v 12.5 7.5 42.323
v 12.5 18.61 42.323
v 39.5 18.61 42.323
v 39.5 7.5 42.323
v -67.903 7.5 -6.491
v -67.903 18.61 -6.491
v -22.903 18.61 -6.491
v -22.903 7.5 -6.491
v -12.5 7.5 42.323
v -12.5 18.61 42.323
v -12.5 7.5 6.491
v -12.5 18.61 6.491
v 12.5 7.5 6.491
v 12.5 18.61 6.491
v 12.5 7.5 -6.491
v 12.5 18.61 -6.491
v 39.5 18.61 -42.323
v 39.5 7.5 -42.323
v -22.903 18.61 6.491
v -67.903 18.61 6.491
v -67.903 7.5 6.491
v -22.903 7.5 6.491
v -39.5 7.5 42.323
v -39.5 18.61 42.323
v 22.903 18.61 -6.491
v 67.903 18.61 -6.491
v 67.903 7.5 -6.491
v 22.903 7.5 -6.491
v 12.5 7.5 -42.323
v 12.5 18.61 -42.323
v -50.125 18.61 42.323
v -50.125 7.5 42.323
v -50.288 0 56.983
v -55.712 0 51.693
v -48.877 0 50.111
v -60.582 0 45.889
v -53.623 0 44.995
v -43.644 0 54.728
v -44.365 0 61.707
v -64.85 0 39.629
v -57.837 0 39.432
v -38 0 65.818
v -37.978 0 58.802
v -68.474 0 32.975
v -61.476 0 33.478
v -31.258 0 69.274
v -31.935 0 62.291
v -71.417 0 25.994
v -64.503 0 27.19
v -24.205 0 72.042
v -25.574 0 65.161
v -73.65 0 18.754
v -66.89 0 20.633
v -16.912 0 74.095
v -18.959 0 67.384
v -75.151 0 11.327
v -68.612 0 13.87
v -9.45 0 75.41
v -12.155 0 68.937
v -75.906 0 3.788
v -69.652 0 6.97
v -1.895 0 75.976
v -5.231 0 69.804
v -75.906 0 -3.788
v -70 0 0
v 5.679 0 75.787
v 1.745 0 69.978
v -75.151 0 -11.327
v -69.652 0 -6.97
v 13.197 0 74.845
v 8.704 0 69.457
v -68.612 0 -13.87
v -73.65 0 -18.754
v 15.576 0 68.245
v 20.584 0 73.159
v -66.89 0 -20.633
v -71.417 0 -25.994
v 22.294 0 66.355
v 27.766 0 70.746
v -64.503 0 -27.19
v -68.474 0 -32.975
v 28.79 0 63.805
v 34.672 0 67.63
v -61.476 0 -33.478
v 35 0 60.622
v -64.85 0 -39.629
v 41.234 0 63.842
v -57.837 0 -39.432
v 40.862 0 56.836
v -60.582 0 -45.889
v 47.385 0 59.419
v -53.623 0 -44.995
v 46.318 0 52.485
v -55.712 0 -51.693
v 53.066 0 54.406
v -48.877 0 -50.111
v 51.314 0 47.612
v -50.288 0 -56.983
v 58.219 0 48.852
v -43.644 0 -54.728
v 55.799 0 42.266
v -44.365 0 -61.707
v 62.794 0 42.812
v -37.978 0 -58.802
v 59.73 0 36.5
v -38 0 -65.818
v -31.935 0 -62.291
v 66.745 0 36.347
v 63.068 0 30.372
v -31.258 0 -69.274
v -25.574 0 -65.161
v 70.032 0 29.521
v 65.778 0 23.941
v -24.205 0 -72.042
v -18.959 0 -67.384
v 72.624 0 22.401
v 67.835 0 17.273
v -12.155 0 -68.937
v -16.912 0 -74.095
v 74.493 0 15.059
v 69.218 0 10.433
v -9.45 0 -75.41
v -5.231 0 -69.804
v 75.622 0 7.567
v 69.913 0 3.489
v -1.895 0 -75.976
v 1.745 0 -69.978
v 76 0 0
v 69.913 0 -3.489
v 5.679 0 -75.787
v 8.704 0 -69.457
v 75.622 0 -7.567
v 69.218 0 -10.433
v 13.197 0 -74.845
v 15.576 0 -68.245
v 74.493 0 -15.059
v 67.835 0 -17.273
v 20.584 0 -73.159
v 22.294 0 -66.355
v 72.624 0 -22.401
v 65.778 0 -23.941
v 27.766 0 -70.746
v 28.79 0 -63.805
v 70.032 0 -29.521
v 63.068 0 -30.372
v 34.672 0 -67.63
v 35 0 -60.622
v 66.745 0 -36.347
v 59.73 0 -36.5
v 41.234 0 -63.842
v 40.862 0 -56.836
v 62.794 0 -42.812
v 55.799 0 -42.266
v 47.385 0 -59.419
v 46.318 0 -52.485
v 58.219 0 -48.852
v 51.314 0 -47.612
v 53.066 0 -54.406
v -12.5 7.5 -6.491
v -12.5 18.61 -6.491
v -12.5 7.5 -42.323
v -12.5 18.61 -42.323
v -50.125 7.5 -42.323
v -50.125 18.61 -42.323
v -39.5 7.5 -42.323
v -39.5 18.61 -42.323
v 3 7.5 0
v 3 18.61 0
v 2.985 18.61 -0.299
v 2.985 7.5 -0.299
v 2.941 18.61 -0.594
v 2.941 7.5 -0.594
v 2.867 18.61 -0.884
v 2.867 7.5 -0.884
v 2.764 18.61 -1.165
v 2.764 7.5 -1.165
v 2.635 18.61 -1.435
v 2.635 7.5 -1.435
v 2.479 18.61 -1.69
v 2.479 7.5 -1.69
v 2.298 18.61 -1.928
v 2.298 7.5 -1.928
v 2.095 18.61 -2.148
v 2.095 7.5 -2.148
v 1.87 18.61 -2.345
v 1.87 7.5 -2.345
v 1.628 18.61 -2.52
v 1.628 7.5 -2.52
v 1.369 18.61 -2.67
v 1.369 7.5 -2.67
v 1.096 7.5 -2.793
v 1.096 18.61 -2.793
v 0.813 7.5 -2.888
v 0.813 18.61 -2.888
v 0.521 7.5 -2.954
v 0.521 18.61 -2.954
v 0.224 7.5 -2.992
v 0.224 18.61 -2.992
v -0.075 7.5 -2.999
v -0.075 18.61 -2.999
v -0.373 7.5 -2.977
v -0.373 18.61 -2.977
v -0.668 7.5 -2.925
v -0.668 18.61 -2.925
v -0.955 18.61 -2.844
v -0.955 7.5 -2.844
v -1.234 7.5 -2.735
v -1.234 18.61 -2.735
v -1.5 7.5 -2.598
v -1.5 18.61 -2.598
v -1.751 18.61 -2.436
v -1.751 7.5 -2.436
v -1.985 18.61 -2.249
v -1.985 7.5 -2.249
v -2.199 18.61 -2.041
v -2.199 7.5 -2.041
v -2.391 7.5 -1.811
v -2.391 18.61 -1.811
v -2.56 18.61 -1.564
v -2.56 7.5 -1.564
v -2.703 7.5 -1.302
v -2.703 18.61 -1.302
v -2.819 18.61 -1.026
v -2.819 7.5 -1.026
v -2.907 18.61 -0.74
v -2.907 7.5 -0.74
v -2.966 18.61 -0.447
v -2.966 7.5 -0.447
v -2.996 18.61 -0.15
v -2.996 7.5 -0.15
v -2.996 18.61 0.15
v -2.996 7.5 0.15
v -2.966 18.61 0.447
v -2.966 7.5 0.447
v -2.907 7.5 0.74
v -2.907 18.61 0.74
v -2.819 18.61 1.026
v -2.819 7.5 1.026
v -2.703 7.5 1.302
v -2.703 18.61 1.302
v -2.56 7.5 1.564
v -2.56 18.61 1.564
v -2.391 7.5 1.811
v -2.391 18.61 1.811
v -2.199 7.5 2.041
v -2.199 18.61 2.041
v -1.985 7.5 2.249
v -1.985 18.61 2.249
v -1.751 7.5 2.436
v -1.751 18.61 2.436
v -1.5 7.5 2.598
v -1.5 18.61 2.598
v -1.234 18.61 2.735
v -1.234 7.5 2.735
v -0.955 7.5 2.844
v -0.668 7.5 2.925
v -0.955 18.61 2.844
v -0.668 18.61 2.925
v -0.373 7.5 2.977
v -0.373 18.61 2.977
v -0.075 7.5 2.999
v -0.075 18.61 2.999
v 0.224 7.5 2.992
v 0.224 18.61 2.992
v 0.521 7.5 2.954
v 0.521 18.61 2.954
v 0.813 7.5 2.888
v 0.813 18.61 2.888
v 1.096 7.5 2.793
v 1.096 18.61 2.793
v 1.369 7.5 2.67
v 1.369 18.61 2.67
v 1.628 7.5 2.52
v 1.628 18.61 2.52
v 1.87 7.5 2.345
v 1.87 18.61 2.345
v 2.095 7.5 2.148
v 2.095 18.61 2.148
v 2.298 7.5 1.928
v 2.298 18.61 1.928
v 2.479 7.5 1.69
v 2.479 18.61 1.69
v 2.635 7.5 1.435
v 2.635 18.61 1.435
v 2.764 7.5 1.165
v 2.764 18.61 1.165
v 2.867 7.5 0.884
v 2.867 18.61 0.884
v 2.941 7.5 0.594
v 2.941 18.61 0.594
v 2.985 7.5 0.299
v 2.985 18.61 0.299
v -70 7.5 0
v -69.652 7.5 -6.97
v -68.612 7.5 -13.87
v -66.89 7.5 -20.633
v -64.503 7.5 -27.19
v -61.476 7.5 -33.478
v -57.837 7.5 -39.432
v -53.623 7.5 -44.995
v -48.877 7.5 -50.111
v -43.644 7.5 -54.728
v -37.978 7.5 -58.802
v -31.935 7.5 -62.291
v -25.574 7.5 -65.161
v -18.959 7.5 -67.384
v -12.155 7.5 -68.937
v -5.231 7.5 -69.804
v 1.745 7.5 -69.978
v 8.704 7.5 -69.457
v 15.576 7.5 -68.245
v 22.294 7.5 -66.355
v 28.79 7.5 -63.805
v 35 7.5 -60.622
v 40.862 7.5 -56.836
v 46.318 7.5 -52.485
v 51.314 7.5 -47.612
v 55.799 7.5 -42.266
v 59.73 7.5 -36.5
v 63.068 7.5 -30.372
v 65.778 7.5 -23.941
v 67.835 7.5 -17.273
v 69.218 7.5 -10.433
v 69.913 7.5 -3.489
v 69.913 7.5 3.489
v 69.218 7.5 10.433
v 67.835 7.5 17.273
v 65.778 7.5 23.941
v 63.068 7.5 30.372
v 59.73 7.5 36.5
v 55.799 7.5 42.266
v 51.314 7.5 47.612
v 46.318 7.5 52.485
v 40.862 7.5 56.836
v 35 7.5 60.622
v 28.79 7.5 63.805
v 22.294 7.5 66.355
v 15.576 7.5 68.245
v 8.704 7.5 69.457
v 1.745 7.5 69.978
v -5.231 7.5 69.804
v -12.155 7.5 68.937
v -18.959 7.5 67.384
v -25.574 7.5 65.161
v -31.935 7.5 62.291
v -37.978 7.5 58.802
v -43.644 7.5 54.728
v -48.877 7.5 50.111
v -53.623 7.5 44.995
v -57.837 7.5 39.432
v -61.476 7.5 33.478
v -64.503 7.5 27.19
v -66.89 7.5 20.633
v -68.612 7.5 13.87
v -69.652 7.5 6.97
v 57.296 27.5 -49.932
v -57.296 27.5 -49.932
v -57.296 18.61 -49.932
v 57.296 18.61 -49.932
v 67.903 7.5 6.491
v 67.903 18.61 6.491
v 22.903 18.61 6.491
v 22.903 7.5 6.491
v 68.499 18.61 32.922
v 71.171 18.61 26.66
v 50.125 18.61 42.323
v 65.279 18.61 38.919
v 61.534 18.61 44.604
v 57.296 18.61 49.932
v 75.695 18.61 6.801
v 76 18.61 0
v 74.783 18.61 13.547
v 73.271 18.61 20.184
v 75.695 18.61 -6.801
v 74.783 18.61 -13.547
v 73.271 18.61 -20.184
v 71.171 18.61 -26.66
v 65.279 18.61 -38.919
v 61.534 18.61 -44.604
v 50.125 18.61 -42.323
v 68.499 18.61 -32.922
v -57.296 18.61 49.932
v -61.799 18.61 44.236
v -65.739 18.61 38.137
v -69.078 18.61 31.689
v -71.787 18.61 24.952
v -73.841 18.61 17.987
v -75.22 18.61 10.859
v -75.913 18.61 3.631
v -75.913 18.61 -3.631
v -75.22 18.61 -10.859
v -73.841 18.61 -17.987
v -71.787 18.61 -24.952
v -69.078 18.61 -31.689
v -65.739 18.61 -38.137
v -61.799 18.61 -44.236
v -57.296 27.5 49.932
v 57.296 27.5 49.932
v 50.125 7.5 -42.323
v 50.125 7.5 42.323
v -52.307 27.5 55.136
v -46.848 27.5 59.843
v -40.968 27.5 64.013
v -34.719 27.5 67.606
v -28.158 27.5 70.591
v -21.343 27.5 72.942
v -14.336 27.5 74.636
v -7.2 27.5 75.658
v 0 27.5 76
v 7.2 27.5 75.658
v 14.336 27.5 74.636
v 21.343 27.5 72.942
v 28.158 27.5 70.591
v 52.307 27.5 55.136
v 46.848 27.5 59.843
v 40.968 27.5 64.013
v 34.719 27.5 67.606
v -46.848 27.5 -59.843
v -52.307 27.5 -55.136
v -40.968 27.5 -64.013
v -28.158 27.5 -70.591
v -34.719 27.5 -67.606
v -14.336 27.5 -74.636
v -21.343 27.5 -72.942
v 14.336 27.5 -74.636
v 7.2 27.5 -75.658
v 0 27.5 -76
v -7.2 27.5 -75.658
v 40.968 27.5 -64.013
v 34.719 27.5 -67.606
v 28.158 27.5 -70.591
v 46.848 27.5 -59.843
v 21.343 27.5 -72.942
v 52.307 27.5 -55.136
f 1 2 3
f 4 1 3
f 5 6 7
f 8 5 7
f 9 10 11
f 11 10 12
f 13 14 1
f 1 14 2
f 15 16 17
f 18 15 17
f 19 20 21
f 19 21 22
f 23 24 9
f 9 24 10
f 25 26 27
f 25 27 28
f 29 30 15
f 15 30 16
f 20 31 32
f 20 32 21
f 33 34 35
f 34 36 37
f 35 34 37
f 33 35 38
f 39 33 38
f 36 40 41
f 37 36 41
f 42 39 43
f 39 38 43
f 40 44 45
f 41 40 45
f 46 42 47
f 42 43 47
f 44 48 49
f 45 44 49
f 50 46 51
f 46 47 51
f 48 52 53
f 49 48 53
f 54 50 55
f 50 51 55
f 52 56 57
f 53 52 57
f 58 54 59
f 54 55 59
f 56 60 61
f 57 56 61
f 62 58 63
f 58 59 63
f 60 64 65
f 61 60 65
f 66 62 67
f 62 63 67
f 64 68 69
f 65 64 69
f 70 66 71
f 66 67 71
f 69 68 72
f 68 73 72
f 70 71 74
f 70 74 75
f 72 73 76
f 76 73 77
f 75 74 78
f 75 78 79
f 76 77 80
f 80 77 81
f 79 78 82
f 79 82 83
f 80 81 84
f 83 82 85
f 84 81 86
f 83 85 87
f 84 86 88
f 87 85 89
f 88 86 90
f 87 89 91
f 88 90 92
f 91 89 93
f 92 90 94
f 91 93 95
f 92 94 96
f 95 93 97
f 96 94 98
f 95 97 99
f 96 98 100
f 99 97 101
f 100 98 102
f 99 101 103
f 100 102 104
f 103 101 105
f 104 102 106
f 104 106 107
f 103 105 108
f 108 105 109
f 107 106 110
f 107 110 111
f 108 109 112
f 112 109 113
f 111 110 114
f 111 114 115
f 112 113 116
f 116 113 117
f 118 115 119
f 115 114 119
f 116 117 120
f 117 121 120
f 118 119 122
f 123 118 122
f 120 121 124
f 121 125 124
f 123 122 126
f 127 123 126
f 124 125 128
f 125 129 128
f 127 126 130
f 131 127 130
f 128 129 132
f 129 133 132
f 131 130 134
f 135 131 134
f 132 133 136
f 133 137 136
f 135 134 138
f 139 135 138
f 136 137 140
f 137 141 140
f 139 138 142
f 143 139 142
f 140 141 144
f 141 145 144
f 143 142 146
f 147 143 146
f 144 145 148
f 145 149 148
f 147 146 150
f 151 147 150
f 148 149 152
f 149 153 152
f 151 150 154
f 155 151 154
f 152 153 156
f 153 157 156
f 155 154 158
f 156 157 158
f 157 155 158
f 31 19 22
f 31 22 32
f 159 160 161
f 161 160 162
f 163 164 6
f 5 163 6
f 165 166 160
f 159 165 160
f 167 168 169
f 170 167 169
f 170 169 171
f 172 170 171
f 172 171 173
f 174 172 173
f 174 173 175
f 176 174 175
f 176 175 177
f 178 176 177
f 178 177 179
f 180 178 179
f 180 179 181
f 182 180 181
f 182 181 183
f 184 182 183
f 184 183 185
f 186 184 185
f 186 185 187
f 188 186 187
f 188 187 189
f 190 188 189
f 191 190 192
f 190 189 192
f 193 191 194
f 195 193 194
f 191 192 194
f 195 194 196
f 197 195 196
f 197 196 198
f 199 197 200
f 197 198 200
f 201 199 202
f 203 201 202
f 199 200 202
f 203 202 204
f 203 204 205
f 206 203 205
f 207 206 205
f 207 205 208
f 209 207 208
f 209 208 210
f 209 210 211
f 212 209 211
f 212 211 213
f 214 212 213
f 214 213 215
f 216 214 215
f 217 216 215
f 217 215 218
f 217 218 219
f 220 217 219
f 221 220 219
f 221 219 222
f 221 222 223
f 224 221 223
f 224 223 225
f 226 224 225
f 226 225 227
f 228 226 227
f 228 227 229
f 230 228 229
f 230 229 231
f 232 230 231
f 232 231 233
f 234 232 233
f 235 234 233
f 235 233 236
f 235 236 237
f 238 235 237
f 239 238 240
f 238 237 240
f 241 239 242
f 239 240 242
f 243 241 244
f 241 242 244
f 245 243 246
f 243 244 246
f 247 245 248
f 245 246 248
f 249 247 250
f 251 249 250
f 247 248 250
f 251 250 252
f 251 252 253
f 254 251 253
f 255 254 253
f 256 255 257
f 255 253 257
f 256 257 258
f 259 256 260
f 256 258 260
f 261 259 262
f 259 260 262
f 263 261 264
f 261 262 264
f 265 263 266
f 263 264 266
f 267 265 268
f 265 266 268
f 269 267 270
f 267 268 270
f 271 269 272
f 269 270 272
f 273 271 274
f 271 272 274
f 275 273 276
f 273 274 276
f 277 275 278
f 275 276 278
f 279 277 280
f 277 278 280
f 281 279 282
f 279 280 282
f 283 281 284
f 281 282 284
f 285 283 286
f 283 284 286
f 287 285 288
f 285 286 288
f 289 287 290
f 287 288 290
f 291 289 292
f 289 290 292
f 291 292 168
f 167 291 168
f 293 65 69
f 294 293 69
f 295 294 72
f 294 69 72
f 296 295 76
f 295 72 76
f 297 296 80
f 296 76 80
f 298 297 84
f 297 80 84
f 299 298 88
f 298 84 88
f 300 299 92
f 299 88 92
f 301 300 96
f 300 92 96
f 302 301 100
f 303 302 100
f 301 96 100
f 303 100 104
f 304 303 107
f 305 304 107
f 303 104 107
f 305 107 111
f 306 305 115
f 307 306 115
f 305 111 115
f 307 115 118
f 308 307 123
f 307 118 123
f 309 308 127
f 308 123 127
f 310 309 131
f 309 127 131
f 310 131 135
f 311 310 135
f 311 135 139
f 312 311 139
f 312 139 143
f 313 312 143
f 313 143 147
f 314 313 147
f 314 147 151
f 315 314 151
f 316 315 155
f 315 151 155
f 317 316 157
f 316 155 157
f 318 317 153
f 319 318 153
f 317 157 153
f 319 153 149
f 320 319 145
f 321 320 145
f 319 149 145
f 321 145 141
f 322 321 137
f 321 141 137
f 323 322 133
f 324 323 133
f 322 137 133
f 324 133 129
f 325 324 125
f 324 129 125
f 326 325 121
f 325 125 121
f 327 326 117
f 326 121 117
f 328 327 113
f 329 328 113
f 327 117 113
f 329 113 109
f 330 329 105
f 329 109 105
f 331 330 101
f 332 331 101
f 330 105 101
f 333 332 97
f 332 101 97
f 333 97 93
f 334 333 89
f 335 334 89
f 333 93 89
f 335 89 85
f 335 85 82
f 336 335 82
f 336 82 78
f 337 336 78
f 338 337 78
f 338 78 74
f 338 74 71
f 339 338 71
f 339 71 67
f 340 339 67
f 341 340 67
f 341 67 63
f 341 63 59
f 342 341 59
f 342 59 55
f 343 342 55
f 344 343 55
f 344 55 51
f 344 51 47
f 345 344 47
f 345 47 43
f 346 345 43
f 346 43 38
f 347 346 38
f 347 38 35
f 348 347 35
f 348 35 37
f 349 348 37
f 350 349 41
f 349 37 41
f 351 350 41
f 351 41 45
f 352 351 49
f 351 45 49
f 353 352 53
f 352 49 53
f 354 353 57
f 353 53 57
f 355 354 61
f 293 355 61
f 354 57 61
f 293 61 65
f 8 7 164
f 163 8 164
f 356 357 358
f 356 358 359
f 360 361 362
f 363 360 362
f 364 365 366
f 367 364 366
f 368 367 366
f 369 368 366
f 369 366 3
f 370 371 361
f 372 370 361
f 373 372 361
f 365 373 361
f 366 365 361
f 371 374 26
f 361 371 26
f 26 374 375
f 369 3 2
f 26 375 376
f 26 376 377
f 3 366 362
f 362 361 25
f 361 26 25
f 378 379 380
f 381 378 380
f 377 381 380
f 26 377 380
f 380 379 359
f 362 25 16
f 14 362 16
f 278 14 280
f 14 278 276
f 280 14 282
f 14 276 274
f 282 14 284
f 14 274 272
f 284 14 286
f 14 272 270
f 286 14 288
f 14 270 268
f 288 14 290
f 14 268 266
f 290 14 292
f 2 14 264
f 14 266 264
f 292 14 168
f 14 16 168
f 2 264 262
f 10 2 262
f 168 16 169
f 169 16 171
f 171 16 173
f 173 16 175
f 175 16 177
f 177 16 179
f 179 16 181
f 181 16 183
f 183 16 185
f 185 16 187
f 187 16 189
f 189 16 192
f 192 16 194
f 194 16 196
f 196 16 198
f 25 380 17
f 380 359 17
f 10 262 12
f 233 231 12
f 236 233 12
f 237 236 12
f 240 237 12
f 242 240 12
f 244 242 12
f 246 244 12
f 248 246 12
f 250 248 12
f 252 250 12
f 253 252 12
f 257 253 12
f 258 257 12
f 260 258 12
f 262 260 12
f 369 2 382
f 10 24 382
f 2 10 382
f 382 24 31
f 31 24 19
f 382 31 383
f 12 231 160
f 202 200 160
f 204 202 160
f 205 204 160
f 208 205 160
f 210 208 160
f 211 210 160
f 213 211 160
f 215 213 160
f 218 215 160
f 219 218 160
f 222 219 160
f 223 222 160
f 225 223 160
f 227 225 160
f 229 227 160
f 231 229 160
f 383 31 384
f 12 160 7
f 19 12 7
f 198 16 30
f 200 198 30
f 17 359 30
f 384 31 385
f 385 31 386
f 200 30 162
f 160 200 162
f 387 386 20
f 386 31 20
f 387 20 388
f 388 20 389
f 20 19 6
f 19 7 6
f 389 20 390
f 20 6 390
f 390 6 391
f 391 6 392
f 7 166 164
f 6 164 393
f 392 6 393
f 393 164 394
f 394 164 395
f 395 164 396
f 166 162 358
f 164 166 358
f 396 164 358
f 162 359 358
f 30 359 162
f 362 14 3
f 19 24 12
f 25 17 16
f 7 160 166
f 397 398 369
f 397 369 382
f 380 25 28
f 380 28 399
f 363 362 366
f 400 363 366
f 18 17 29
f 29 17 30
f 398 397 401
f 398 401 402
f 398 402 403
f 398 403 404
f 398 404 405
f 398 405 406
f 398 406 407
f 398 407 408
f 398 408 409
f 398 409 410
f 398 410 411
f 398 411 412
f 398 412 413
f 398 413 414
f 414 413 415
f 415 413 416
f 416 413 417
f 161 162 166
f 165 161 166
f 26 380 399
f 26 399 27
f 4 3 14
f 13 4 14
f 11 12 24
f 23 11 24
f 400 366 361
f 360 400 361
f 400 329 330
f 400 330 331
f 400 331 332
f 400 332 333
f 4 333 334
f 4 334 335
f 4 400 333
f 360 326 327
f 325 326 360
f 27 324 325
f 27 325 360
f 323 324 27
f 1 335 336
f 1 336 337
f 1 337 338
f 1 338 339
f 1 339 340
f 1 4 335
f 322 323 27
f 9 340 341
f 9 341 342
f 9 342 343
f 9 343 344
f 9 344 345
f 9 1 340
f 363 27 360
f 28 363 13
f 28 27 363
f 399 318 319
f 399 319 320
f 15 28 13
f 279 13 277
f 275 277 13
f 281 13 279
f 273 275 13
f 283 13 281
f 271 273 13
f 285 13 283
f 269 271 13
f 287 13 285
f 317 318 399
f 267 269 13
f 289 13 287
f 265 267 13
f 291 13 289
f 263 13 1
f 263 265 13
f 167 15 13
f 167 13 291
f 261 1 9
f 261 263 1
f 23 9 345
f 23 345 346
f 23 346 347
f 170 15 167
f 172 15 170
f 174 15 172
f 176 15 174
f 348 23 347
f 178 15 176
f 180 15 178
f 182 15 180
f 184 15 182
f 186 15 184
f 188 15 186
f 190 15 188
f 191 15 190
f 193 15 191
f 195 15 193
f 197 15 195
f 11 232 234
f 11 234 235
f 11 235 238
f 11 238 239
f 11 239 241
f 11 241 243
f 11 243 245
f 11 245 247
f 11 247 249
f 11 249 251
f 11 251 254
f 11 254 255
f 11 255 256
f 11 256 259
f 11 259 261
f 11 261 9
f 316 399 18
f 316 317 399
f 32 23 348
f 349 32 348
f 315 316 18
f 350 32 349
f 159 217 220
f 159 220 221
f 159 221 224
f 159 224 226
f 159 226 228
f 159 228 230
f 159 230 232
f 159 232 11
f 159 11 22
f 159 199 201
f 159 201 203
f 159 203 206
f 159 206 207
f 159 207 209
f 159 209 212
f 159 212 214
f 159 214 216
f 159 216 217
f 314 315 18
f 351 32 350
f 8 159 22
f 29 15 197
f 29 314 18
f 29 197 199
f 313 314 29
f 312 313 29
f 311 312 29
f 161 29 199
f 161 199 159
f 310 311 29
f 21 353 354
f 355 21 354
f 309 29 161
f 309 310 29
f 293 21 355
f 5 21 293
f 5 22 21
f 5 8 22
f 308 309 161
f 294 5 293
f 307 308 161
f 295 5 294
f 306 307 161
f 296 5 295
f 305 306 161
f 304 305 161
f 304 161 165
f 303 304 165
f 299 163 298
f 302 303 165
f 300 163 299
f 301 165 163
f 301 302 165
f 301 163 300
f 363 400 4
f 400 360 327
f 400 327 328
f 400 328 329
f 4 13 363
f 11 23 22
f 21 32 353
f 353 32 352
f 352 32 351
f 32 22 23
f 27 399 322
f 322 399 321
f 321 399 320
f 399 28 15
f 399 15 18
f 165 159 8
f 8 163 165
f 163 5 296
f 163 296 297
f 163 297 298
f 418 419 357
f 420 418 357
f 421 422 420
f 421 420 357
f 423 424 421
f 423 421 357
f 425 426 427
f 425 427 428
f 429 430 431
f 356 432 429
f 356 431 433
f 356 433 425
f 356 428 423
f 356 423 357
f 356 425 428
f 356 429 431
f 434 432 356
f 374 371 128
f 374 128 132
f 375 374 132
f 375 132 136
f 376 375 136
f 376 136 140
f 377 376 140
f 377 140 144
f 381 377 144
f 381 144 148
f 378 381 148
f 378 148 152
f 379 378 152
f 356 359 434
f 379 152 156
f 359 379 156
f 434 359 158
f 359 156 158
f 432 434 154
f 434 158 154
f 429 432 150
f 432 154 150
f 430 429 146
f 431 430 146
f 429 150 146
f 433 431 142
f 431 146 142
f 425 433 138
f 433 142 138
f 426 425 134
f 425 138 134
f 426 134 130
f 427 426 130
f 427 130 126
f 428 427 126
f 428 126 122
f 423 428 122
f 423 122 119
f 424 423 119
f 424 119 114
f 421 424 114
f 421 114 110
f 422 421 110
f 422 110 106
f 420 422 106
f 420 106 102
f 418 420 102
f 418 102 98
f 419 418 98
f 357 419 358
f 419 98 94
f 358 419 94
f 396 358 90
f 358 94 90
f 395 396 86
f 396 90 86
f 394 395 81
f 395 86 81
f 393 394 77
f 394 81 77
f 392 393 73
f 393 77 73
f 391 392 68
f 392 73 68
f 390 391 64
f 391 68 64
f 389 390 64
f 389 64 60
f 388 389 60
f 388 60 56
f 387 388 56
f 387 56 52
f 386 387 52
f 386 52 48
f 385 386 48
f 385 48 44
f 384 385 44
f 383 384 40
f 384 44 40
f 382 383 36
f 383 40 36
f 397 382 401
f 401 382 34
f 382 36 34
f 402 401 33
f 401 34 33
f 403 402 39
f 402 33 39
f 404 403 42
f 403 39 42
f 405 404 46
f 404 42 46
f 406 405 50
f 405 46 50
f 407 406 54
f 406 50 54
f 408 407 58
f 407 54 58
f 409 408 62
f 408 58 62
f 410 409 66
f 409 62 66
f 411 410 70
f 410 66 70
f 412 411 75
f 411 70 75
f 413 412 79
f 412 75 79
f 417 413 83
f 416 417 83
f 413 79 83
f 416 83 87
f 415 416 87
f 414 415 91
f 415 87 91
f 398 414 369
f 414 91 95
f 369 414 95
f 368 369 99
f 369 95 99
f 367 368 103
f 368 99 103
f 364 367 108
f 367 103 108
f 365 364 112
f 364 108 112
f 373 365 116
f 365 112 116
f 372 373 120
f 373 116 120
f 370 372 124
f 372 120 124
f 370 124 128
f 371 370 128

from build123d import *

# Parameters (mm, degrees)
SKETCH1_R           = 76
BOSS_EXTRUDE1_DEPTH = 27.5
CUT_EXTRUDE4_DEPTH  = 8.89
SKETCH5_R           = 3
CUT_EXTRUDE5_DEPTH  = 20
CUT_EXTRUDE6_DEPTH  = 19.61
CUT_EXTRUDE7_DEPTH  = 19.61
SKETCH13_R          = 70
CUT_EXTRUDE9_DEPTH  = 7.5


with BuildPart() as part:
    # Sketch1 → Boss-Extrude1 (new body)
    with BuildSketch(Plane(origin=(0, 0, 0), x_dir=(1, 0, 0), z_dir=(0, 1, 0))):
        Circle(SKETCH1_R)
    extrude(amount=BOSS_EXTRUDE1_DEPTH)

    # Sketch2 → Cut-Extrude4 (cut)
    with BuildSketch(Plane(origin=(0, 27.5, 0), x_dir=(1, 0, 0), z_dir=(0, 1, 0))):
        with BuildLine():
            Line((-58.007955522, 49.931796385), (58.007955522, 49.931796385))
            ThreePointArc((58.007955522, 49.931796385), (107.939751907, 0), (58.007955522, -49.931796385))
            Line((58.007955522, -49.931796385), (-58.007955522, -49.931796385))
            ThreePointArc((-58.007955522, -49.931796385), (-107.939751907, 0), (-58.007955522, 49.931796385))
        make_face()
    extrude(amount=-CUT_EXTRUDE4_DEPTH, mode=Mode.SUBTRACT)

    # Sketch5 → Cut-Extrude5 (cut)
    with BuildSketch(Plane(origin=(0, 18.61, 0), x_dir=(1, 0, 0), z_dir=(0, 1, 0))):
        Circle(SKETCH5_R)
    extrude(amount=-CUT_EXTRUDE5_DEPTH, mode=Mode.SUBTRACT)

    # Sketch7 → Cut-Extrude6 (cut, through all)
    with BuildSketch(Plane(origin=(0, 18.61, 0), x_dir=(1, 0, 0), z_dir=(0, 1, 0))):
        Polygon((-50.125135648, 42.322849323), (-67.902913426, 6.490592664), (-22.902913426, 6.490592664), align=None)
        Polygon((67.902913426, 6.490592664), (22.902913426, 6.490592664), (50.125135648, 42.322849323), align=None)
        Polygon((50.125135648, -42.322849323), (67.902913426, -6.490592664), (22.902913426, -6.490592664), align=None)
        Polygon((-67.902913426, -6.490592664), (-22.902913426, -6.490592664), (-50.125135648, -42.322849323), align=None)
    extrude(amount=-CUT_EXTRUDE6_DEPTH, mode=Mode.SUBTRACT)

    # Sketch9 → Cut-Extrude7 (cut, through all)
    with BuildSketch(Plane(origin=(0, 18.61, 0), x_dir=(1, 0, 0), z_dir=(0, 1, 0))):
        Polygon((-12.5, 6.490592664), (-12.5, 42.322849323), (-39.5, 42.322849323), align=None)
        Polygon((12.5, 6.490592664), (39.5, 42.322849323), (12.5, 42.322849323), align=None)
        Polygon((12.5, -6.490592664), (12.5, -42.322849323), (39.5, -42.322849323), align=None)
        Polygon((-12.5, -6.490592664), (-39.5, -42.322849323), (-12.5, -42.322849323), align=None)
    extrude(amount=-CUT_EXTRUDE7_DEPTH, mode=Mode.SUBTRACT)

    # Sketch13 → Cut-Extrude9 (cut)
    with BuildSketch(Plane(origin=(0, 0, 0), x_dir=(-1, 0, 0), z_dir=(0, -1, 0))):
        Circle(SKETCH13_R)
    extrude(amount=-CUT_EXTRUDE9_DEPTH, mode=Mode.SUBTRACT)


solid = part.part
